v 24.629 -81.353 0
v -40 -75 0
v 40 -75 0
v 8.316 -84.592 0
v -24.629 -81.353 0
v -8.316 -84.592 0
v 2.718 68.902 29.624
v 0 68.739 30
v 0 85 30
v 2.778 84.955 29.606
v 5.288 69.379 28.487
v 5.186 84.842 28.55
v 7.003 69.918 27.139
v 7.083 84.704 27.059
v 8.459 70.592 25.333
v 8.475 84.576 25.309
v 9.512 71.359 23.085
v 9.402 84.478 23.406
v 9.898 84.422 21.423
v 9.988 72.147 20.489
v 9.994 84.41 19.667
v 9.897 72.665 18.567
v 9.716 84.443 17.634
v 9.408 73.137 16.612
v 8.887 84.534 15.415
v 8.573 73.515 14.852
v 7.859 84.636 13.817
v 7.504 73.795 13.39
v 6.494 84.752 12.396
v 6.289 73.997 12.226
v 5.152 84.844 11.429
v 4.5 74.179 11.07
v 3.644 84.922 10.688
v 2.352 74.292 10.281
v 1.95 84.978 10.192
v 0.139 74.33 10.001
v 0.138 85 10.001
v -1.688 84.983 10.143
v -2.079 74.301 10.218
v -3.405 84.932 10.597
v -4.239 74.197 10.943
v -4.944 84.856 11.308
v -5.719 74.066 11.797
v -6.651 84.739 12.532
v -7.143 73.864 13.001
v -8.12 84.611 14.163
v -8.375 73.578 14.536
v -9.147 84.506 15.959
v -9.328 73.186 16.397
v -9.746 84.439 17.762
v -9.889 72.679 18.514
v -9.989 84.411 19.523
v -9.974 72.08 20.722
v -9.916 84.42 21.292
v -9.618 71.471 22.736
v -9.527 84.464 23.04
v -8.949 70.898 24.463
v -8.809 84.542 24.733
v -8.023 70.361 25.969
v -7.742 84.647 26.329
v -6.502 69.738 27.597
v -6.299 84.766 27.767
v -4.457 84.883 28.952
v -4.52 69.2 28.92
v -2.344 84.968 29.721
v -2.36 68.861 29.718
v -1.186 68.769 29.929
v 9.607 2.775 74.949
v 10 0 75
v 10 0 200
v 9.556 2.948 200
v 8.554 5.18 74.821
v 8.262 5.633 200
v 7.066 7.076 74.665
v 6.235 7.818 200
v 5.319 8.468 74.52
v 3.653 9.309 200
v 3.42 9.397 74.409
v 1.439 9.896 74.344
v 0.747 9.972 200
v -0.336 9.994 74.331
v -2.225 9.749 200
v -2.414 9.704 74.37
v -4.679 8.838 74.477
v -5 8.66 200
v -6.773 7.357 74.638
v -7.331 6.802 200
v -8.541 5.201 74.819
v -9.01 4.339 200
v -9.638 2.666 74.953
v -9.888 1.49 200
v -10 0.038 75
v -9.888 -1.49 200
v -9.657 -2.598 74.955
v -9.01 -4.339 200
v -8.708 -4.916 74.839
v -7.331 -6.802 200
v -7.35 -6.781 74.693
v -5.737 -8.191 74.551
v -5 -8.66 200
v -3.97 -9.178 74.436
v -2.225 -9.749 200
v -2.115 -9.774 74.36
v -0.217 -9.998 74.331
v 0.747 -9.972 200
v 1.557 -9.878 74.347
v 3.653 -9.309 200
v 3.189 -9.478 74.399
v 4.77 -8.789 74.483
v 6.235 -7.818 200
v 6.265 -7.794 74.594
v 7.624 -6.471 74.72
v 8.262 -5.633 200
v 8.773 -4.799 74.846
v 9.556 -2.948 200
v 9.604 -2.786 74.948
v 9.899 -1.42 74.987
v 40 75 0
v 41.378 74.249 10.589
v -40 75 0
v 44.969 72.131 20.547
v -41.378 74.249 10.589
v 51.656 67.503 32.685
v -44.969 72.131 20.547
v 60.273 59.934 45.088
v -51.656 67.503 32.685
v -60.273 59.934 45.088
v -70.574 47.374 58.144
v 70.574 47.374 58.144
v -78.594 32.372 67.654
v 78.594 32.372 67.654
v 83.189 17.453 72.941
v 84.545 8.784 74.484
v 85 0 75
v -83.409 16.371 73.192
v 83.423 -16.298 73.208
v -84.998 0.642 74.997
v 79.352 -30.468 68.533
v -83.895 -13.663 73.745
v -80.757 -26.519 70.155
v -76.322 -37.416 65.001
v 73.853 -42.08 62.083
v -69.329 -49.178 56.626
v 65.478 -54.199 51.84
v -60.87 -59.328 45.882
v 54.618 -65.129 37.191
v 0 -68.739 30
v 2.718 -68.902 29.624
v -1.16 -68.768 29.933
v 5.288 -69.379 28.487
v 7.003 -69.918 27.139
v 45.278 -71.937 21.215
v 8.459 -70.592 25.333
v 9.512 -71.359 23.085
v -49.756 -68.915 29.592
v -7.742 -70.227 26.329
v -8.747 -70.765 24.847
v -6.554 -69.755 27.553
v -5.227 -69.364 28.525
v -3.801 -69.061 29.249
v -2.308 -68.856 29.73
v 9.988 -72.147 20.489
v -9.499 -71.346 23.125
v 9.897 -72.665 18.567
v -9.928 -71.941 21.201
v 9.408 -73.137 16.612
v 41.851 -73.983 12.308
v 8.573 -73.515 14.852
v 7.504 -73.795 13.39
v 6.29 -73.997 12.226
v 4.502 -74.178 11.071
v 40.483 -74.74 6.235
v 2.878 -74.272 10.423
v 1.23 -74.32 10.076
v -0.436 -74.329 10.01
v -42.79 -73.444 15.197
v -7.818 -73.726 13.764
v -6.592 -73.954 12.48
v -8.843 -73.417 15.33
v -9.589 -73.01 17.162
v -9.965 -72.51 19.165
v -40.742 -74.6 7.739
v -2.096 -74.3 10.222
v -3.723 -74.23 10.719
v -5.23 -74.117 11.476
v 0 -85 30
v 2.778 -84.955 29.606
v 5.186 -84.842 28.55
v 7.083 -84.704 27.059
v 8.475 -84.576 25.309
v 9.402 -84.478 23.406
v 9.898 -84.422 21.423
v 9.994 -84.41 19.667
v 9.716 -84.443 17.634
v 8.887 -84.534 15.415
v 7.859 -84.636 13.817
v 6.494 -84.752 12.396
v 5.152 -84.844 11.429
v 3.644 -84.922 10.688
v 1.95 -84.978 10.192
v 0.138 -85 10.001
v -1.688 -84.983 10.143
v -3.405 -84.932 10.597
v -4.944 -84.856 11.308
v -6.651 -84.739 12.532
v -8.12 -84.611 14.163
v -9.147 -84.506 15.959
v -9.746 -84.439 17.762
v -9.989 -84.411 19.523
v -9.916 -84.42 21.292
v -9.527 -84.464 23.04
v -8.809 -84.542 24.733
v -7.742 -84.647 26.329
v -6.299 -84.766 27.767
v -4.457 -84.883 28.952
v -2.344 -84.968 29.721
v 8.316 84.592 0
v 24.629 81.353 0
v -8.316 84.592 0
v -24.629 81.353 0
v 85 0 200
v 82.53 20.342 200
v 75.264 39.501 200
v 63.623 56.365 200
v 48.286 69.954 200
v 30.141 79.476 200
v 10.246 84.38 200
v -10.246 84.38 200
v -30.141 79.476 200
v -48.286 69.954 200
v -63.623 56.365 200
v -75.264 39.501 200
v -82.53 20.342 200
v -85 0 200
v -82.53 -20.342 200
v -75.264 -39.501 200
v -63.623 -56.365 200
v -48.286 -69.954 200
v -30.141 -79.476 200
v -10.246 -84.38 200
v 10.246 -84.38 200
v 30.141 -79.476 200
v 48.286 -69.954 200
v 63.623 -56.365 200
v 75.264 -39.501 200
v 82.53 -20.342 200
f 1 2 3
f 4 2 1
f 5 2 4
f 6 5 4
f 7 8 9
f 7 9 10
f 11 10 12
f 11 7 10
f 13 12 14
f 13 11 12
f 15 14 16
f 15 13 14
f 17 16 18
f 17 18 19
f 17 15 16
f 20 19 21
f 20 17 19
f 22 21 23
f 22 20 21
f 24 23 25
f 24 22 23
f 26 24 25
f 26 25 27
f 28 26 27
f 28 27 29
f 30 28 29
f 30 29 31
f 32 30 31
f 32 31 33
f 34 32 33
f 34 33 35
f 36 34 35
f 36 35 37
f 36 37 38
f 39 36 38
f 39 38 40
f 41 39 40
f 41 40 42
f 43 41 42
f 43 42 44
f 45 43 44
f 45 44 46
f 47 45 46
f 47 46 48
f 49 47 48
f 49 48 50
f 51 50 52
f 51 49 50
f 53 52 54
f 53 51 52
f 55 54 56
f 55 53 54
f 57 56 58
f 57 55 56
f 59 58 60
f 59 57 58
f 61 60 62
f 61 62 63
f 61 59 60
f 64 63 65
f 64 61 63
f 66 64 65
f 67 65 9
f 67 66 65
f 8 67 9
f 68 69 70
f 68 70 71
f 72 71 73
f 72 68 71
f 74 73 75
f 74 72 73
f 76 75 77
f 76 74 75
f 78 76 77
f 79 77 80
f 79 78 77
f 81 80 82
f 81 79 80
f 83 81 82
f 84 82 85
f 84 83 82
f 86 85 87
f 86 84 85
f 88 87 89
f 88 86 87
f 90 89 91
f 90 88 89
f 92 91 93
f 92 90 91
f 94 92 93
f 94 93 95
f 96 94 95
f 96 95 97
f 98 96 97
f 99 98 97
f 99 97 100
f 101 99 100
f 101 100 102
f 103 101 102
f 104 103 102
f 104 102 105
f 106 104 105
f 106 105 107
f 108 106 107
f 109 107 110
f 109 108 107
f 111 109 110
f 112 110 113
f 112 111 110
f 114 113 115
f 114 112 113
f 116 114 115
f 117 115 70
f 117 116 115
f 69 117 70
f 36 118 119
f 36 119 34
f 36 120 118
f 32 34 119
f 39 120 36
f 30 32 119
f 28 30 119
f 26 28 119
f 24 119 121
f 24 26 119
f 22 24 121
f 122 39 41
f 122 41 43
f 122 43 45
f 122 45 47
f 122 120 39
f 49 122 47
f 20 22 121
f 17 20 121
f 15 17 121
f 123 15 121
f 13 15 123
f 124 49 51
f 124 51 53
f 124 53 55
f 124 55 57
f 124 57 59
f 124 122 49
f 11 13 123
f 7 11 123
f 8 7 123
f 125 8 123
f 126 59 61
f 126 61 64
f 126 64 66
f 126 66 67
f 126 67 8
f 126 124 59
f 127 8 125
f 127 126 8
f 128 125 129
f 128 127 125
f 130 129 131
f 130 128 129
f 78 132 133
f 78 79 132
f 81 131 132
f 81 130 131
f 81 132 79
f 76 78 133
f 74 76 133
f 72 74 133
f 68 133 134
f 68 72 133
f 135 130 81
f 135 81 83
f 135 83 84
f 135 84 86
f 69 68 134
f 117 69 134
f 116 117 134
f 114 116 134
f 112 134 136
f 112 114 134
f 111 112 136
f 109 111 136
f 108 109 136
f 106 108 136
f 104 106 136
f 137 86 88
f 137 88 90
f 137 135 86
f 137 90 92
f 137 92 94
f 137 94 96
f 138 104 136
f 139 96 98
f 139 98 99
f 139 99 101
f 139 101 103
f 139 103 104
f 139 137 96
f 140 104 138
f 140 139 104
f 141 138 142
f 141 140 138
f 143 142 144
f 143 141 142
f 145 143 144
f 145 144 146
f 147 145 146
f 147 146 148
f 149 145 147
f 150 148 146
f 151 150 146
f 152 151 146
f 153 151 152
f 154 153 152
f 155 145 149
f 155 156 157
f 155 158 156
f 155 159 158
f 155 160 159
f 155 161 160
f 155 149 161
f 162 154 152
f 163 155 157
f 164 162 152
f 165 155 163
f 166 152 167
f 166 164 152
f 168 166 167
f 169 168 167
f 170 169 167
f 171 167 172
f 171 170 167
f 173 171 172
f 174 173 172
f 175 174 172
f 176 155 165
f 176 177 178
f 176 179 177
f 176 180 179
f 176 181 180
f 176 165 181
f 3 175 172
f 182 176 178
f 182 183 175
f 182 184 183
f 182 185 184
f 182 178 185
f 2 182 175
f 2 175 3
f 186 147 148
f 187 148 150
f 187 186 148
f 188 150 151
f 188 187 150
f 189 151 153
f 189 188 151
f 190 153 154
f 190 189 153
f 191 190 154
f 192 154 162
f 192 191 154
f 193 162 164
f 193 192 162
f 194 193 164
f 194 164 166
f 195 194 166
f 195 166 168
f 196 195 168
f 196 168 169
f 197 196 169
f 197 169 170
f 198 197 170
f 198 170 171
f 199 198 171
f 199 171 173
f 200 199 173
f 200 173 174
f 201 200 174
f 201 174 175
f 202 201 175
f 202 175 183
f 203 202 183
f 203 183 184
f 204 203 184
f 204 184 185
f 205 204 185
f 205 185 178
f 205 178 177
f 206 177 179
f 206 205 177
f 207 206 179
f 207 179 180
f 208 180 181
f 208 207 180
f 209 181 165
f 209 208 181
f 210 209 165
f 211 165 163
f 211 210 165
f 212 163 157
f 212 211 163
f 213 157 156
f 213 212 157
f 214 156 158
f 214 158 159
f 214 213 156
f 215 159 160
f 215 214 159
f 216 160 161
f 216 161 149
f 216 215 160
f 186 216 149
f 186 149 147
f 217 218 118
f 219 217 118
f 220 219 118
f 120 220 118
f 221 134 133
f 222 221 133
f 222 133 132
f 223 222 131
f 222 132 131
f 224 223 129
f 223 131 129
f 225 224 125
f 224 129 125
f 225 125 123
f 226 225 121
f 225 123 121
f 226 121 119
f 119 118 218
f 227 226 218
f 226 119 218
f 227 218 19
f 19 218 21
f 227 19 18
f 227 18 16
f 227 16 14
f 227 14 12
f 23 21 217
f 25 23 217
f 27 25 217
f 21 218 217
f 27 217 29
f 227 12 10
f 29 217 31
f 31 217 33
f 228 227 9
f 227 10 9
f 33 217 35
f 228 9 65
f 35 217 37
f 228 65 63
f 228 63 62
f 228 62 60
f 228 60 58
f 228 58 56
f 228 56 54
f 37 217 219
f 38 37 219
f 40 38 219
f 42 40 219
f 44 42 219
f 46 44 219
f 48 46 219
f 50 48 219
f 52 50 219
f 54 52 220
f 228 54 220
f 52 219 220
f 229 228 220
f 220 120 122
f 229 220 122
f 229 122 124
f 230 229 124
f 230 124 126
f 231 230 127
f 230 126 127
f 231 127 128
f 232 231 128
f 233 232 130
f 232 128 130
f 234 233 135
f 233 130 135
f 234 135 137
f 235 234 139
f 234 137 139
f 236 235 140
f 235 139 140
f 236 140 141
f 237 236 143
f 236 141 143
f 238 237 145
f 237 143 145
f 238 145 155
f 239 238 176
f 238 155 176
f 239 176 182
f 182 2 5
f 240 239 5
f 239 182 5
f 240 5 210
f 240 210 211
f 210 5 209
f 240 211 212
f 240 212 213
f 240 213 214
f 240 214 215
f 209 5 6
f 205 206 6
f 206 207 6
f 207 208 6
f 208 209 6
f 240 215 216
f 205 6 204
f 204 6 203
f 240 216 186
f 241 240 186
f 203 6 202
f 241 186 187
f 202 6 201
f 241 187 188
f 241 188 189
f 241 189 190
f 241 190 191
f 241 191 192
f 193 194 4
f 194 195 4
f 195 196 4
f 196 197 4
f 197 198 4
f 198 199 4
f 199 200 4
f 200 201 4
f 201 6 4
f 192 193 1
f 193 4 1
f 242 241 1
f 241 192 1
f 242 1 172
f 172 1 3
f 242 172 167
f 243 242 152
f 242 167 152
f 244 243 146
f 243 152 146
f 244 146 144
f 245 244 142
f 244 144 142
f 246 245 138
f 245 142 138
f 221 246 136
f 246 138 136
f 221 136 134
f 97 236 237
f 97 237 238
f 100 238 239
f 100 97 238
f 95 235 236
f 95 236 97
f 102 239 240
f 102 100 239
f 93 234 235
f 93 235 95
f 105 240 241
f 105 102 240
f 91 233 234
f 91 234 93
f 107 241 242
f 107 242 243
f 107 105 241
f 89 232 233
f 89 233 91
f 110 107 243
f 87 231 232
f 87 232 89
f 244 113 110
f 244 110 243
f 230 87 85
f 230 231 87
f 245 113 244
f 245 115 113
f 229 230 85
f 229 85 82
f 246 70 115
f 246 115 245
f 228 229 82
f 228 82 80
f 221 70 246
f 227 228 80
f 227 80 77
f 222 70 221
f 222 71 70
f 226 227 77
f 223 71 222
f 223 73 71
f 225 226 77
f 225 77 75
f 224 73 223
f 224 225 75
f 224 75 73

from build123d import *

# Parameters (mm, degrees)
SKETCH1_R               = 85
BOSS_EXTRUDE1_DEPTH     = 200
CUT_EXTRUDE1_DEPTH      = 234.345237792
CUT_EXTRUDE1_DEPTH_BACK = 234.345237792
SKETCH2_R               = 75
CUT_EXTRUDE3_DEPTH      = 234.34523795
CUT_EXTRUDE3_DEPTH_BACK = 234.34523795
SKETCH3_R               = 10
CUT_EXTRUDE4_DEPTH      = 234.34523795
CUT_EXTRUDE4_DEPTH_BACK = 234.34523795
SKETCH4_R               = 10


with BuildPart() as part:
    # Sketch1 → Boss-Extrude1 (new body)
    with BuildSketch(Plane.XY):
        Circle(SKETCH1_R)
    extrude(amount=BOSS_EXTRUDE1_DEPTH)

    # Sketch2 → Cut-Extrude1 (cut, two sides: drawn at the far end of the back side and taken through both)
    with BuildSketch(Plane(origin=(0, 0, 0), x_dir=(0, 0, -1), z_dir=(1, 0, 0)).offset(-CUT_EXTRUDE1_DEPTH_BACK)):
        Circle(SKETCH2_R)
    extrude(amount=CUT_EXTRUDE1_DEPTH + CUT_EXTRUDE1_DEPTH_BACK, mode=Mode.SUBTRACT)

    # Sketch3 → Cut-Extrude3 (cut, two sides: drawn at the far end of the back side and taken through both)
    with BuildSketch(Plane(origin=(0, 0, 0), x_dir=(1, 0, 0), z_dir=(0, 1, 0)).offset(-CUT_EXTRUDE3_DEPTH_BACK)):
        with Locations(Location((0, -20, 0), (0, 0, 270))):
            Circle(SKETCH3_R)
    extrude(amount=CUT_EXTRUDE3_DEPTH + CUT_EXTRUDE3_DEPTH_BACK, mode=Mode.SUBTRACT)

    # Sketch4 → Cut-Extrude4 (cut, two sides: drawn at the far end of the back side and taken through both)
    with BuildSketch(Plane.XY.offset(-CUT_EXTRUDE4_DEPTH_BACK)):
        Circle(SKETCH4_R)
    extrude(amount=CUT_EXTRUDE4_DEPTH + CUT_EXTRUDE4_DEPTH_BACK, mode=Mode.SUBTRACT)


solid = part.part
